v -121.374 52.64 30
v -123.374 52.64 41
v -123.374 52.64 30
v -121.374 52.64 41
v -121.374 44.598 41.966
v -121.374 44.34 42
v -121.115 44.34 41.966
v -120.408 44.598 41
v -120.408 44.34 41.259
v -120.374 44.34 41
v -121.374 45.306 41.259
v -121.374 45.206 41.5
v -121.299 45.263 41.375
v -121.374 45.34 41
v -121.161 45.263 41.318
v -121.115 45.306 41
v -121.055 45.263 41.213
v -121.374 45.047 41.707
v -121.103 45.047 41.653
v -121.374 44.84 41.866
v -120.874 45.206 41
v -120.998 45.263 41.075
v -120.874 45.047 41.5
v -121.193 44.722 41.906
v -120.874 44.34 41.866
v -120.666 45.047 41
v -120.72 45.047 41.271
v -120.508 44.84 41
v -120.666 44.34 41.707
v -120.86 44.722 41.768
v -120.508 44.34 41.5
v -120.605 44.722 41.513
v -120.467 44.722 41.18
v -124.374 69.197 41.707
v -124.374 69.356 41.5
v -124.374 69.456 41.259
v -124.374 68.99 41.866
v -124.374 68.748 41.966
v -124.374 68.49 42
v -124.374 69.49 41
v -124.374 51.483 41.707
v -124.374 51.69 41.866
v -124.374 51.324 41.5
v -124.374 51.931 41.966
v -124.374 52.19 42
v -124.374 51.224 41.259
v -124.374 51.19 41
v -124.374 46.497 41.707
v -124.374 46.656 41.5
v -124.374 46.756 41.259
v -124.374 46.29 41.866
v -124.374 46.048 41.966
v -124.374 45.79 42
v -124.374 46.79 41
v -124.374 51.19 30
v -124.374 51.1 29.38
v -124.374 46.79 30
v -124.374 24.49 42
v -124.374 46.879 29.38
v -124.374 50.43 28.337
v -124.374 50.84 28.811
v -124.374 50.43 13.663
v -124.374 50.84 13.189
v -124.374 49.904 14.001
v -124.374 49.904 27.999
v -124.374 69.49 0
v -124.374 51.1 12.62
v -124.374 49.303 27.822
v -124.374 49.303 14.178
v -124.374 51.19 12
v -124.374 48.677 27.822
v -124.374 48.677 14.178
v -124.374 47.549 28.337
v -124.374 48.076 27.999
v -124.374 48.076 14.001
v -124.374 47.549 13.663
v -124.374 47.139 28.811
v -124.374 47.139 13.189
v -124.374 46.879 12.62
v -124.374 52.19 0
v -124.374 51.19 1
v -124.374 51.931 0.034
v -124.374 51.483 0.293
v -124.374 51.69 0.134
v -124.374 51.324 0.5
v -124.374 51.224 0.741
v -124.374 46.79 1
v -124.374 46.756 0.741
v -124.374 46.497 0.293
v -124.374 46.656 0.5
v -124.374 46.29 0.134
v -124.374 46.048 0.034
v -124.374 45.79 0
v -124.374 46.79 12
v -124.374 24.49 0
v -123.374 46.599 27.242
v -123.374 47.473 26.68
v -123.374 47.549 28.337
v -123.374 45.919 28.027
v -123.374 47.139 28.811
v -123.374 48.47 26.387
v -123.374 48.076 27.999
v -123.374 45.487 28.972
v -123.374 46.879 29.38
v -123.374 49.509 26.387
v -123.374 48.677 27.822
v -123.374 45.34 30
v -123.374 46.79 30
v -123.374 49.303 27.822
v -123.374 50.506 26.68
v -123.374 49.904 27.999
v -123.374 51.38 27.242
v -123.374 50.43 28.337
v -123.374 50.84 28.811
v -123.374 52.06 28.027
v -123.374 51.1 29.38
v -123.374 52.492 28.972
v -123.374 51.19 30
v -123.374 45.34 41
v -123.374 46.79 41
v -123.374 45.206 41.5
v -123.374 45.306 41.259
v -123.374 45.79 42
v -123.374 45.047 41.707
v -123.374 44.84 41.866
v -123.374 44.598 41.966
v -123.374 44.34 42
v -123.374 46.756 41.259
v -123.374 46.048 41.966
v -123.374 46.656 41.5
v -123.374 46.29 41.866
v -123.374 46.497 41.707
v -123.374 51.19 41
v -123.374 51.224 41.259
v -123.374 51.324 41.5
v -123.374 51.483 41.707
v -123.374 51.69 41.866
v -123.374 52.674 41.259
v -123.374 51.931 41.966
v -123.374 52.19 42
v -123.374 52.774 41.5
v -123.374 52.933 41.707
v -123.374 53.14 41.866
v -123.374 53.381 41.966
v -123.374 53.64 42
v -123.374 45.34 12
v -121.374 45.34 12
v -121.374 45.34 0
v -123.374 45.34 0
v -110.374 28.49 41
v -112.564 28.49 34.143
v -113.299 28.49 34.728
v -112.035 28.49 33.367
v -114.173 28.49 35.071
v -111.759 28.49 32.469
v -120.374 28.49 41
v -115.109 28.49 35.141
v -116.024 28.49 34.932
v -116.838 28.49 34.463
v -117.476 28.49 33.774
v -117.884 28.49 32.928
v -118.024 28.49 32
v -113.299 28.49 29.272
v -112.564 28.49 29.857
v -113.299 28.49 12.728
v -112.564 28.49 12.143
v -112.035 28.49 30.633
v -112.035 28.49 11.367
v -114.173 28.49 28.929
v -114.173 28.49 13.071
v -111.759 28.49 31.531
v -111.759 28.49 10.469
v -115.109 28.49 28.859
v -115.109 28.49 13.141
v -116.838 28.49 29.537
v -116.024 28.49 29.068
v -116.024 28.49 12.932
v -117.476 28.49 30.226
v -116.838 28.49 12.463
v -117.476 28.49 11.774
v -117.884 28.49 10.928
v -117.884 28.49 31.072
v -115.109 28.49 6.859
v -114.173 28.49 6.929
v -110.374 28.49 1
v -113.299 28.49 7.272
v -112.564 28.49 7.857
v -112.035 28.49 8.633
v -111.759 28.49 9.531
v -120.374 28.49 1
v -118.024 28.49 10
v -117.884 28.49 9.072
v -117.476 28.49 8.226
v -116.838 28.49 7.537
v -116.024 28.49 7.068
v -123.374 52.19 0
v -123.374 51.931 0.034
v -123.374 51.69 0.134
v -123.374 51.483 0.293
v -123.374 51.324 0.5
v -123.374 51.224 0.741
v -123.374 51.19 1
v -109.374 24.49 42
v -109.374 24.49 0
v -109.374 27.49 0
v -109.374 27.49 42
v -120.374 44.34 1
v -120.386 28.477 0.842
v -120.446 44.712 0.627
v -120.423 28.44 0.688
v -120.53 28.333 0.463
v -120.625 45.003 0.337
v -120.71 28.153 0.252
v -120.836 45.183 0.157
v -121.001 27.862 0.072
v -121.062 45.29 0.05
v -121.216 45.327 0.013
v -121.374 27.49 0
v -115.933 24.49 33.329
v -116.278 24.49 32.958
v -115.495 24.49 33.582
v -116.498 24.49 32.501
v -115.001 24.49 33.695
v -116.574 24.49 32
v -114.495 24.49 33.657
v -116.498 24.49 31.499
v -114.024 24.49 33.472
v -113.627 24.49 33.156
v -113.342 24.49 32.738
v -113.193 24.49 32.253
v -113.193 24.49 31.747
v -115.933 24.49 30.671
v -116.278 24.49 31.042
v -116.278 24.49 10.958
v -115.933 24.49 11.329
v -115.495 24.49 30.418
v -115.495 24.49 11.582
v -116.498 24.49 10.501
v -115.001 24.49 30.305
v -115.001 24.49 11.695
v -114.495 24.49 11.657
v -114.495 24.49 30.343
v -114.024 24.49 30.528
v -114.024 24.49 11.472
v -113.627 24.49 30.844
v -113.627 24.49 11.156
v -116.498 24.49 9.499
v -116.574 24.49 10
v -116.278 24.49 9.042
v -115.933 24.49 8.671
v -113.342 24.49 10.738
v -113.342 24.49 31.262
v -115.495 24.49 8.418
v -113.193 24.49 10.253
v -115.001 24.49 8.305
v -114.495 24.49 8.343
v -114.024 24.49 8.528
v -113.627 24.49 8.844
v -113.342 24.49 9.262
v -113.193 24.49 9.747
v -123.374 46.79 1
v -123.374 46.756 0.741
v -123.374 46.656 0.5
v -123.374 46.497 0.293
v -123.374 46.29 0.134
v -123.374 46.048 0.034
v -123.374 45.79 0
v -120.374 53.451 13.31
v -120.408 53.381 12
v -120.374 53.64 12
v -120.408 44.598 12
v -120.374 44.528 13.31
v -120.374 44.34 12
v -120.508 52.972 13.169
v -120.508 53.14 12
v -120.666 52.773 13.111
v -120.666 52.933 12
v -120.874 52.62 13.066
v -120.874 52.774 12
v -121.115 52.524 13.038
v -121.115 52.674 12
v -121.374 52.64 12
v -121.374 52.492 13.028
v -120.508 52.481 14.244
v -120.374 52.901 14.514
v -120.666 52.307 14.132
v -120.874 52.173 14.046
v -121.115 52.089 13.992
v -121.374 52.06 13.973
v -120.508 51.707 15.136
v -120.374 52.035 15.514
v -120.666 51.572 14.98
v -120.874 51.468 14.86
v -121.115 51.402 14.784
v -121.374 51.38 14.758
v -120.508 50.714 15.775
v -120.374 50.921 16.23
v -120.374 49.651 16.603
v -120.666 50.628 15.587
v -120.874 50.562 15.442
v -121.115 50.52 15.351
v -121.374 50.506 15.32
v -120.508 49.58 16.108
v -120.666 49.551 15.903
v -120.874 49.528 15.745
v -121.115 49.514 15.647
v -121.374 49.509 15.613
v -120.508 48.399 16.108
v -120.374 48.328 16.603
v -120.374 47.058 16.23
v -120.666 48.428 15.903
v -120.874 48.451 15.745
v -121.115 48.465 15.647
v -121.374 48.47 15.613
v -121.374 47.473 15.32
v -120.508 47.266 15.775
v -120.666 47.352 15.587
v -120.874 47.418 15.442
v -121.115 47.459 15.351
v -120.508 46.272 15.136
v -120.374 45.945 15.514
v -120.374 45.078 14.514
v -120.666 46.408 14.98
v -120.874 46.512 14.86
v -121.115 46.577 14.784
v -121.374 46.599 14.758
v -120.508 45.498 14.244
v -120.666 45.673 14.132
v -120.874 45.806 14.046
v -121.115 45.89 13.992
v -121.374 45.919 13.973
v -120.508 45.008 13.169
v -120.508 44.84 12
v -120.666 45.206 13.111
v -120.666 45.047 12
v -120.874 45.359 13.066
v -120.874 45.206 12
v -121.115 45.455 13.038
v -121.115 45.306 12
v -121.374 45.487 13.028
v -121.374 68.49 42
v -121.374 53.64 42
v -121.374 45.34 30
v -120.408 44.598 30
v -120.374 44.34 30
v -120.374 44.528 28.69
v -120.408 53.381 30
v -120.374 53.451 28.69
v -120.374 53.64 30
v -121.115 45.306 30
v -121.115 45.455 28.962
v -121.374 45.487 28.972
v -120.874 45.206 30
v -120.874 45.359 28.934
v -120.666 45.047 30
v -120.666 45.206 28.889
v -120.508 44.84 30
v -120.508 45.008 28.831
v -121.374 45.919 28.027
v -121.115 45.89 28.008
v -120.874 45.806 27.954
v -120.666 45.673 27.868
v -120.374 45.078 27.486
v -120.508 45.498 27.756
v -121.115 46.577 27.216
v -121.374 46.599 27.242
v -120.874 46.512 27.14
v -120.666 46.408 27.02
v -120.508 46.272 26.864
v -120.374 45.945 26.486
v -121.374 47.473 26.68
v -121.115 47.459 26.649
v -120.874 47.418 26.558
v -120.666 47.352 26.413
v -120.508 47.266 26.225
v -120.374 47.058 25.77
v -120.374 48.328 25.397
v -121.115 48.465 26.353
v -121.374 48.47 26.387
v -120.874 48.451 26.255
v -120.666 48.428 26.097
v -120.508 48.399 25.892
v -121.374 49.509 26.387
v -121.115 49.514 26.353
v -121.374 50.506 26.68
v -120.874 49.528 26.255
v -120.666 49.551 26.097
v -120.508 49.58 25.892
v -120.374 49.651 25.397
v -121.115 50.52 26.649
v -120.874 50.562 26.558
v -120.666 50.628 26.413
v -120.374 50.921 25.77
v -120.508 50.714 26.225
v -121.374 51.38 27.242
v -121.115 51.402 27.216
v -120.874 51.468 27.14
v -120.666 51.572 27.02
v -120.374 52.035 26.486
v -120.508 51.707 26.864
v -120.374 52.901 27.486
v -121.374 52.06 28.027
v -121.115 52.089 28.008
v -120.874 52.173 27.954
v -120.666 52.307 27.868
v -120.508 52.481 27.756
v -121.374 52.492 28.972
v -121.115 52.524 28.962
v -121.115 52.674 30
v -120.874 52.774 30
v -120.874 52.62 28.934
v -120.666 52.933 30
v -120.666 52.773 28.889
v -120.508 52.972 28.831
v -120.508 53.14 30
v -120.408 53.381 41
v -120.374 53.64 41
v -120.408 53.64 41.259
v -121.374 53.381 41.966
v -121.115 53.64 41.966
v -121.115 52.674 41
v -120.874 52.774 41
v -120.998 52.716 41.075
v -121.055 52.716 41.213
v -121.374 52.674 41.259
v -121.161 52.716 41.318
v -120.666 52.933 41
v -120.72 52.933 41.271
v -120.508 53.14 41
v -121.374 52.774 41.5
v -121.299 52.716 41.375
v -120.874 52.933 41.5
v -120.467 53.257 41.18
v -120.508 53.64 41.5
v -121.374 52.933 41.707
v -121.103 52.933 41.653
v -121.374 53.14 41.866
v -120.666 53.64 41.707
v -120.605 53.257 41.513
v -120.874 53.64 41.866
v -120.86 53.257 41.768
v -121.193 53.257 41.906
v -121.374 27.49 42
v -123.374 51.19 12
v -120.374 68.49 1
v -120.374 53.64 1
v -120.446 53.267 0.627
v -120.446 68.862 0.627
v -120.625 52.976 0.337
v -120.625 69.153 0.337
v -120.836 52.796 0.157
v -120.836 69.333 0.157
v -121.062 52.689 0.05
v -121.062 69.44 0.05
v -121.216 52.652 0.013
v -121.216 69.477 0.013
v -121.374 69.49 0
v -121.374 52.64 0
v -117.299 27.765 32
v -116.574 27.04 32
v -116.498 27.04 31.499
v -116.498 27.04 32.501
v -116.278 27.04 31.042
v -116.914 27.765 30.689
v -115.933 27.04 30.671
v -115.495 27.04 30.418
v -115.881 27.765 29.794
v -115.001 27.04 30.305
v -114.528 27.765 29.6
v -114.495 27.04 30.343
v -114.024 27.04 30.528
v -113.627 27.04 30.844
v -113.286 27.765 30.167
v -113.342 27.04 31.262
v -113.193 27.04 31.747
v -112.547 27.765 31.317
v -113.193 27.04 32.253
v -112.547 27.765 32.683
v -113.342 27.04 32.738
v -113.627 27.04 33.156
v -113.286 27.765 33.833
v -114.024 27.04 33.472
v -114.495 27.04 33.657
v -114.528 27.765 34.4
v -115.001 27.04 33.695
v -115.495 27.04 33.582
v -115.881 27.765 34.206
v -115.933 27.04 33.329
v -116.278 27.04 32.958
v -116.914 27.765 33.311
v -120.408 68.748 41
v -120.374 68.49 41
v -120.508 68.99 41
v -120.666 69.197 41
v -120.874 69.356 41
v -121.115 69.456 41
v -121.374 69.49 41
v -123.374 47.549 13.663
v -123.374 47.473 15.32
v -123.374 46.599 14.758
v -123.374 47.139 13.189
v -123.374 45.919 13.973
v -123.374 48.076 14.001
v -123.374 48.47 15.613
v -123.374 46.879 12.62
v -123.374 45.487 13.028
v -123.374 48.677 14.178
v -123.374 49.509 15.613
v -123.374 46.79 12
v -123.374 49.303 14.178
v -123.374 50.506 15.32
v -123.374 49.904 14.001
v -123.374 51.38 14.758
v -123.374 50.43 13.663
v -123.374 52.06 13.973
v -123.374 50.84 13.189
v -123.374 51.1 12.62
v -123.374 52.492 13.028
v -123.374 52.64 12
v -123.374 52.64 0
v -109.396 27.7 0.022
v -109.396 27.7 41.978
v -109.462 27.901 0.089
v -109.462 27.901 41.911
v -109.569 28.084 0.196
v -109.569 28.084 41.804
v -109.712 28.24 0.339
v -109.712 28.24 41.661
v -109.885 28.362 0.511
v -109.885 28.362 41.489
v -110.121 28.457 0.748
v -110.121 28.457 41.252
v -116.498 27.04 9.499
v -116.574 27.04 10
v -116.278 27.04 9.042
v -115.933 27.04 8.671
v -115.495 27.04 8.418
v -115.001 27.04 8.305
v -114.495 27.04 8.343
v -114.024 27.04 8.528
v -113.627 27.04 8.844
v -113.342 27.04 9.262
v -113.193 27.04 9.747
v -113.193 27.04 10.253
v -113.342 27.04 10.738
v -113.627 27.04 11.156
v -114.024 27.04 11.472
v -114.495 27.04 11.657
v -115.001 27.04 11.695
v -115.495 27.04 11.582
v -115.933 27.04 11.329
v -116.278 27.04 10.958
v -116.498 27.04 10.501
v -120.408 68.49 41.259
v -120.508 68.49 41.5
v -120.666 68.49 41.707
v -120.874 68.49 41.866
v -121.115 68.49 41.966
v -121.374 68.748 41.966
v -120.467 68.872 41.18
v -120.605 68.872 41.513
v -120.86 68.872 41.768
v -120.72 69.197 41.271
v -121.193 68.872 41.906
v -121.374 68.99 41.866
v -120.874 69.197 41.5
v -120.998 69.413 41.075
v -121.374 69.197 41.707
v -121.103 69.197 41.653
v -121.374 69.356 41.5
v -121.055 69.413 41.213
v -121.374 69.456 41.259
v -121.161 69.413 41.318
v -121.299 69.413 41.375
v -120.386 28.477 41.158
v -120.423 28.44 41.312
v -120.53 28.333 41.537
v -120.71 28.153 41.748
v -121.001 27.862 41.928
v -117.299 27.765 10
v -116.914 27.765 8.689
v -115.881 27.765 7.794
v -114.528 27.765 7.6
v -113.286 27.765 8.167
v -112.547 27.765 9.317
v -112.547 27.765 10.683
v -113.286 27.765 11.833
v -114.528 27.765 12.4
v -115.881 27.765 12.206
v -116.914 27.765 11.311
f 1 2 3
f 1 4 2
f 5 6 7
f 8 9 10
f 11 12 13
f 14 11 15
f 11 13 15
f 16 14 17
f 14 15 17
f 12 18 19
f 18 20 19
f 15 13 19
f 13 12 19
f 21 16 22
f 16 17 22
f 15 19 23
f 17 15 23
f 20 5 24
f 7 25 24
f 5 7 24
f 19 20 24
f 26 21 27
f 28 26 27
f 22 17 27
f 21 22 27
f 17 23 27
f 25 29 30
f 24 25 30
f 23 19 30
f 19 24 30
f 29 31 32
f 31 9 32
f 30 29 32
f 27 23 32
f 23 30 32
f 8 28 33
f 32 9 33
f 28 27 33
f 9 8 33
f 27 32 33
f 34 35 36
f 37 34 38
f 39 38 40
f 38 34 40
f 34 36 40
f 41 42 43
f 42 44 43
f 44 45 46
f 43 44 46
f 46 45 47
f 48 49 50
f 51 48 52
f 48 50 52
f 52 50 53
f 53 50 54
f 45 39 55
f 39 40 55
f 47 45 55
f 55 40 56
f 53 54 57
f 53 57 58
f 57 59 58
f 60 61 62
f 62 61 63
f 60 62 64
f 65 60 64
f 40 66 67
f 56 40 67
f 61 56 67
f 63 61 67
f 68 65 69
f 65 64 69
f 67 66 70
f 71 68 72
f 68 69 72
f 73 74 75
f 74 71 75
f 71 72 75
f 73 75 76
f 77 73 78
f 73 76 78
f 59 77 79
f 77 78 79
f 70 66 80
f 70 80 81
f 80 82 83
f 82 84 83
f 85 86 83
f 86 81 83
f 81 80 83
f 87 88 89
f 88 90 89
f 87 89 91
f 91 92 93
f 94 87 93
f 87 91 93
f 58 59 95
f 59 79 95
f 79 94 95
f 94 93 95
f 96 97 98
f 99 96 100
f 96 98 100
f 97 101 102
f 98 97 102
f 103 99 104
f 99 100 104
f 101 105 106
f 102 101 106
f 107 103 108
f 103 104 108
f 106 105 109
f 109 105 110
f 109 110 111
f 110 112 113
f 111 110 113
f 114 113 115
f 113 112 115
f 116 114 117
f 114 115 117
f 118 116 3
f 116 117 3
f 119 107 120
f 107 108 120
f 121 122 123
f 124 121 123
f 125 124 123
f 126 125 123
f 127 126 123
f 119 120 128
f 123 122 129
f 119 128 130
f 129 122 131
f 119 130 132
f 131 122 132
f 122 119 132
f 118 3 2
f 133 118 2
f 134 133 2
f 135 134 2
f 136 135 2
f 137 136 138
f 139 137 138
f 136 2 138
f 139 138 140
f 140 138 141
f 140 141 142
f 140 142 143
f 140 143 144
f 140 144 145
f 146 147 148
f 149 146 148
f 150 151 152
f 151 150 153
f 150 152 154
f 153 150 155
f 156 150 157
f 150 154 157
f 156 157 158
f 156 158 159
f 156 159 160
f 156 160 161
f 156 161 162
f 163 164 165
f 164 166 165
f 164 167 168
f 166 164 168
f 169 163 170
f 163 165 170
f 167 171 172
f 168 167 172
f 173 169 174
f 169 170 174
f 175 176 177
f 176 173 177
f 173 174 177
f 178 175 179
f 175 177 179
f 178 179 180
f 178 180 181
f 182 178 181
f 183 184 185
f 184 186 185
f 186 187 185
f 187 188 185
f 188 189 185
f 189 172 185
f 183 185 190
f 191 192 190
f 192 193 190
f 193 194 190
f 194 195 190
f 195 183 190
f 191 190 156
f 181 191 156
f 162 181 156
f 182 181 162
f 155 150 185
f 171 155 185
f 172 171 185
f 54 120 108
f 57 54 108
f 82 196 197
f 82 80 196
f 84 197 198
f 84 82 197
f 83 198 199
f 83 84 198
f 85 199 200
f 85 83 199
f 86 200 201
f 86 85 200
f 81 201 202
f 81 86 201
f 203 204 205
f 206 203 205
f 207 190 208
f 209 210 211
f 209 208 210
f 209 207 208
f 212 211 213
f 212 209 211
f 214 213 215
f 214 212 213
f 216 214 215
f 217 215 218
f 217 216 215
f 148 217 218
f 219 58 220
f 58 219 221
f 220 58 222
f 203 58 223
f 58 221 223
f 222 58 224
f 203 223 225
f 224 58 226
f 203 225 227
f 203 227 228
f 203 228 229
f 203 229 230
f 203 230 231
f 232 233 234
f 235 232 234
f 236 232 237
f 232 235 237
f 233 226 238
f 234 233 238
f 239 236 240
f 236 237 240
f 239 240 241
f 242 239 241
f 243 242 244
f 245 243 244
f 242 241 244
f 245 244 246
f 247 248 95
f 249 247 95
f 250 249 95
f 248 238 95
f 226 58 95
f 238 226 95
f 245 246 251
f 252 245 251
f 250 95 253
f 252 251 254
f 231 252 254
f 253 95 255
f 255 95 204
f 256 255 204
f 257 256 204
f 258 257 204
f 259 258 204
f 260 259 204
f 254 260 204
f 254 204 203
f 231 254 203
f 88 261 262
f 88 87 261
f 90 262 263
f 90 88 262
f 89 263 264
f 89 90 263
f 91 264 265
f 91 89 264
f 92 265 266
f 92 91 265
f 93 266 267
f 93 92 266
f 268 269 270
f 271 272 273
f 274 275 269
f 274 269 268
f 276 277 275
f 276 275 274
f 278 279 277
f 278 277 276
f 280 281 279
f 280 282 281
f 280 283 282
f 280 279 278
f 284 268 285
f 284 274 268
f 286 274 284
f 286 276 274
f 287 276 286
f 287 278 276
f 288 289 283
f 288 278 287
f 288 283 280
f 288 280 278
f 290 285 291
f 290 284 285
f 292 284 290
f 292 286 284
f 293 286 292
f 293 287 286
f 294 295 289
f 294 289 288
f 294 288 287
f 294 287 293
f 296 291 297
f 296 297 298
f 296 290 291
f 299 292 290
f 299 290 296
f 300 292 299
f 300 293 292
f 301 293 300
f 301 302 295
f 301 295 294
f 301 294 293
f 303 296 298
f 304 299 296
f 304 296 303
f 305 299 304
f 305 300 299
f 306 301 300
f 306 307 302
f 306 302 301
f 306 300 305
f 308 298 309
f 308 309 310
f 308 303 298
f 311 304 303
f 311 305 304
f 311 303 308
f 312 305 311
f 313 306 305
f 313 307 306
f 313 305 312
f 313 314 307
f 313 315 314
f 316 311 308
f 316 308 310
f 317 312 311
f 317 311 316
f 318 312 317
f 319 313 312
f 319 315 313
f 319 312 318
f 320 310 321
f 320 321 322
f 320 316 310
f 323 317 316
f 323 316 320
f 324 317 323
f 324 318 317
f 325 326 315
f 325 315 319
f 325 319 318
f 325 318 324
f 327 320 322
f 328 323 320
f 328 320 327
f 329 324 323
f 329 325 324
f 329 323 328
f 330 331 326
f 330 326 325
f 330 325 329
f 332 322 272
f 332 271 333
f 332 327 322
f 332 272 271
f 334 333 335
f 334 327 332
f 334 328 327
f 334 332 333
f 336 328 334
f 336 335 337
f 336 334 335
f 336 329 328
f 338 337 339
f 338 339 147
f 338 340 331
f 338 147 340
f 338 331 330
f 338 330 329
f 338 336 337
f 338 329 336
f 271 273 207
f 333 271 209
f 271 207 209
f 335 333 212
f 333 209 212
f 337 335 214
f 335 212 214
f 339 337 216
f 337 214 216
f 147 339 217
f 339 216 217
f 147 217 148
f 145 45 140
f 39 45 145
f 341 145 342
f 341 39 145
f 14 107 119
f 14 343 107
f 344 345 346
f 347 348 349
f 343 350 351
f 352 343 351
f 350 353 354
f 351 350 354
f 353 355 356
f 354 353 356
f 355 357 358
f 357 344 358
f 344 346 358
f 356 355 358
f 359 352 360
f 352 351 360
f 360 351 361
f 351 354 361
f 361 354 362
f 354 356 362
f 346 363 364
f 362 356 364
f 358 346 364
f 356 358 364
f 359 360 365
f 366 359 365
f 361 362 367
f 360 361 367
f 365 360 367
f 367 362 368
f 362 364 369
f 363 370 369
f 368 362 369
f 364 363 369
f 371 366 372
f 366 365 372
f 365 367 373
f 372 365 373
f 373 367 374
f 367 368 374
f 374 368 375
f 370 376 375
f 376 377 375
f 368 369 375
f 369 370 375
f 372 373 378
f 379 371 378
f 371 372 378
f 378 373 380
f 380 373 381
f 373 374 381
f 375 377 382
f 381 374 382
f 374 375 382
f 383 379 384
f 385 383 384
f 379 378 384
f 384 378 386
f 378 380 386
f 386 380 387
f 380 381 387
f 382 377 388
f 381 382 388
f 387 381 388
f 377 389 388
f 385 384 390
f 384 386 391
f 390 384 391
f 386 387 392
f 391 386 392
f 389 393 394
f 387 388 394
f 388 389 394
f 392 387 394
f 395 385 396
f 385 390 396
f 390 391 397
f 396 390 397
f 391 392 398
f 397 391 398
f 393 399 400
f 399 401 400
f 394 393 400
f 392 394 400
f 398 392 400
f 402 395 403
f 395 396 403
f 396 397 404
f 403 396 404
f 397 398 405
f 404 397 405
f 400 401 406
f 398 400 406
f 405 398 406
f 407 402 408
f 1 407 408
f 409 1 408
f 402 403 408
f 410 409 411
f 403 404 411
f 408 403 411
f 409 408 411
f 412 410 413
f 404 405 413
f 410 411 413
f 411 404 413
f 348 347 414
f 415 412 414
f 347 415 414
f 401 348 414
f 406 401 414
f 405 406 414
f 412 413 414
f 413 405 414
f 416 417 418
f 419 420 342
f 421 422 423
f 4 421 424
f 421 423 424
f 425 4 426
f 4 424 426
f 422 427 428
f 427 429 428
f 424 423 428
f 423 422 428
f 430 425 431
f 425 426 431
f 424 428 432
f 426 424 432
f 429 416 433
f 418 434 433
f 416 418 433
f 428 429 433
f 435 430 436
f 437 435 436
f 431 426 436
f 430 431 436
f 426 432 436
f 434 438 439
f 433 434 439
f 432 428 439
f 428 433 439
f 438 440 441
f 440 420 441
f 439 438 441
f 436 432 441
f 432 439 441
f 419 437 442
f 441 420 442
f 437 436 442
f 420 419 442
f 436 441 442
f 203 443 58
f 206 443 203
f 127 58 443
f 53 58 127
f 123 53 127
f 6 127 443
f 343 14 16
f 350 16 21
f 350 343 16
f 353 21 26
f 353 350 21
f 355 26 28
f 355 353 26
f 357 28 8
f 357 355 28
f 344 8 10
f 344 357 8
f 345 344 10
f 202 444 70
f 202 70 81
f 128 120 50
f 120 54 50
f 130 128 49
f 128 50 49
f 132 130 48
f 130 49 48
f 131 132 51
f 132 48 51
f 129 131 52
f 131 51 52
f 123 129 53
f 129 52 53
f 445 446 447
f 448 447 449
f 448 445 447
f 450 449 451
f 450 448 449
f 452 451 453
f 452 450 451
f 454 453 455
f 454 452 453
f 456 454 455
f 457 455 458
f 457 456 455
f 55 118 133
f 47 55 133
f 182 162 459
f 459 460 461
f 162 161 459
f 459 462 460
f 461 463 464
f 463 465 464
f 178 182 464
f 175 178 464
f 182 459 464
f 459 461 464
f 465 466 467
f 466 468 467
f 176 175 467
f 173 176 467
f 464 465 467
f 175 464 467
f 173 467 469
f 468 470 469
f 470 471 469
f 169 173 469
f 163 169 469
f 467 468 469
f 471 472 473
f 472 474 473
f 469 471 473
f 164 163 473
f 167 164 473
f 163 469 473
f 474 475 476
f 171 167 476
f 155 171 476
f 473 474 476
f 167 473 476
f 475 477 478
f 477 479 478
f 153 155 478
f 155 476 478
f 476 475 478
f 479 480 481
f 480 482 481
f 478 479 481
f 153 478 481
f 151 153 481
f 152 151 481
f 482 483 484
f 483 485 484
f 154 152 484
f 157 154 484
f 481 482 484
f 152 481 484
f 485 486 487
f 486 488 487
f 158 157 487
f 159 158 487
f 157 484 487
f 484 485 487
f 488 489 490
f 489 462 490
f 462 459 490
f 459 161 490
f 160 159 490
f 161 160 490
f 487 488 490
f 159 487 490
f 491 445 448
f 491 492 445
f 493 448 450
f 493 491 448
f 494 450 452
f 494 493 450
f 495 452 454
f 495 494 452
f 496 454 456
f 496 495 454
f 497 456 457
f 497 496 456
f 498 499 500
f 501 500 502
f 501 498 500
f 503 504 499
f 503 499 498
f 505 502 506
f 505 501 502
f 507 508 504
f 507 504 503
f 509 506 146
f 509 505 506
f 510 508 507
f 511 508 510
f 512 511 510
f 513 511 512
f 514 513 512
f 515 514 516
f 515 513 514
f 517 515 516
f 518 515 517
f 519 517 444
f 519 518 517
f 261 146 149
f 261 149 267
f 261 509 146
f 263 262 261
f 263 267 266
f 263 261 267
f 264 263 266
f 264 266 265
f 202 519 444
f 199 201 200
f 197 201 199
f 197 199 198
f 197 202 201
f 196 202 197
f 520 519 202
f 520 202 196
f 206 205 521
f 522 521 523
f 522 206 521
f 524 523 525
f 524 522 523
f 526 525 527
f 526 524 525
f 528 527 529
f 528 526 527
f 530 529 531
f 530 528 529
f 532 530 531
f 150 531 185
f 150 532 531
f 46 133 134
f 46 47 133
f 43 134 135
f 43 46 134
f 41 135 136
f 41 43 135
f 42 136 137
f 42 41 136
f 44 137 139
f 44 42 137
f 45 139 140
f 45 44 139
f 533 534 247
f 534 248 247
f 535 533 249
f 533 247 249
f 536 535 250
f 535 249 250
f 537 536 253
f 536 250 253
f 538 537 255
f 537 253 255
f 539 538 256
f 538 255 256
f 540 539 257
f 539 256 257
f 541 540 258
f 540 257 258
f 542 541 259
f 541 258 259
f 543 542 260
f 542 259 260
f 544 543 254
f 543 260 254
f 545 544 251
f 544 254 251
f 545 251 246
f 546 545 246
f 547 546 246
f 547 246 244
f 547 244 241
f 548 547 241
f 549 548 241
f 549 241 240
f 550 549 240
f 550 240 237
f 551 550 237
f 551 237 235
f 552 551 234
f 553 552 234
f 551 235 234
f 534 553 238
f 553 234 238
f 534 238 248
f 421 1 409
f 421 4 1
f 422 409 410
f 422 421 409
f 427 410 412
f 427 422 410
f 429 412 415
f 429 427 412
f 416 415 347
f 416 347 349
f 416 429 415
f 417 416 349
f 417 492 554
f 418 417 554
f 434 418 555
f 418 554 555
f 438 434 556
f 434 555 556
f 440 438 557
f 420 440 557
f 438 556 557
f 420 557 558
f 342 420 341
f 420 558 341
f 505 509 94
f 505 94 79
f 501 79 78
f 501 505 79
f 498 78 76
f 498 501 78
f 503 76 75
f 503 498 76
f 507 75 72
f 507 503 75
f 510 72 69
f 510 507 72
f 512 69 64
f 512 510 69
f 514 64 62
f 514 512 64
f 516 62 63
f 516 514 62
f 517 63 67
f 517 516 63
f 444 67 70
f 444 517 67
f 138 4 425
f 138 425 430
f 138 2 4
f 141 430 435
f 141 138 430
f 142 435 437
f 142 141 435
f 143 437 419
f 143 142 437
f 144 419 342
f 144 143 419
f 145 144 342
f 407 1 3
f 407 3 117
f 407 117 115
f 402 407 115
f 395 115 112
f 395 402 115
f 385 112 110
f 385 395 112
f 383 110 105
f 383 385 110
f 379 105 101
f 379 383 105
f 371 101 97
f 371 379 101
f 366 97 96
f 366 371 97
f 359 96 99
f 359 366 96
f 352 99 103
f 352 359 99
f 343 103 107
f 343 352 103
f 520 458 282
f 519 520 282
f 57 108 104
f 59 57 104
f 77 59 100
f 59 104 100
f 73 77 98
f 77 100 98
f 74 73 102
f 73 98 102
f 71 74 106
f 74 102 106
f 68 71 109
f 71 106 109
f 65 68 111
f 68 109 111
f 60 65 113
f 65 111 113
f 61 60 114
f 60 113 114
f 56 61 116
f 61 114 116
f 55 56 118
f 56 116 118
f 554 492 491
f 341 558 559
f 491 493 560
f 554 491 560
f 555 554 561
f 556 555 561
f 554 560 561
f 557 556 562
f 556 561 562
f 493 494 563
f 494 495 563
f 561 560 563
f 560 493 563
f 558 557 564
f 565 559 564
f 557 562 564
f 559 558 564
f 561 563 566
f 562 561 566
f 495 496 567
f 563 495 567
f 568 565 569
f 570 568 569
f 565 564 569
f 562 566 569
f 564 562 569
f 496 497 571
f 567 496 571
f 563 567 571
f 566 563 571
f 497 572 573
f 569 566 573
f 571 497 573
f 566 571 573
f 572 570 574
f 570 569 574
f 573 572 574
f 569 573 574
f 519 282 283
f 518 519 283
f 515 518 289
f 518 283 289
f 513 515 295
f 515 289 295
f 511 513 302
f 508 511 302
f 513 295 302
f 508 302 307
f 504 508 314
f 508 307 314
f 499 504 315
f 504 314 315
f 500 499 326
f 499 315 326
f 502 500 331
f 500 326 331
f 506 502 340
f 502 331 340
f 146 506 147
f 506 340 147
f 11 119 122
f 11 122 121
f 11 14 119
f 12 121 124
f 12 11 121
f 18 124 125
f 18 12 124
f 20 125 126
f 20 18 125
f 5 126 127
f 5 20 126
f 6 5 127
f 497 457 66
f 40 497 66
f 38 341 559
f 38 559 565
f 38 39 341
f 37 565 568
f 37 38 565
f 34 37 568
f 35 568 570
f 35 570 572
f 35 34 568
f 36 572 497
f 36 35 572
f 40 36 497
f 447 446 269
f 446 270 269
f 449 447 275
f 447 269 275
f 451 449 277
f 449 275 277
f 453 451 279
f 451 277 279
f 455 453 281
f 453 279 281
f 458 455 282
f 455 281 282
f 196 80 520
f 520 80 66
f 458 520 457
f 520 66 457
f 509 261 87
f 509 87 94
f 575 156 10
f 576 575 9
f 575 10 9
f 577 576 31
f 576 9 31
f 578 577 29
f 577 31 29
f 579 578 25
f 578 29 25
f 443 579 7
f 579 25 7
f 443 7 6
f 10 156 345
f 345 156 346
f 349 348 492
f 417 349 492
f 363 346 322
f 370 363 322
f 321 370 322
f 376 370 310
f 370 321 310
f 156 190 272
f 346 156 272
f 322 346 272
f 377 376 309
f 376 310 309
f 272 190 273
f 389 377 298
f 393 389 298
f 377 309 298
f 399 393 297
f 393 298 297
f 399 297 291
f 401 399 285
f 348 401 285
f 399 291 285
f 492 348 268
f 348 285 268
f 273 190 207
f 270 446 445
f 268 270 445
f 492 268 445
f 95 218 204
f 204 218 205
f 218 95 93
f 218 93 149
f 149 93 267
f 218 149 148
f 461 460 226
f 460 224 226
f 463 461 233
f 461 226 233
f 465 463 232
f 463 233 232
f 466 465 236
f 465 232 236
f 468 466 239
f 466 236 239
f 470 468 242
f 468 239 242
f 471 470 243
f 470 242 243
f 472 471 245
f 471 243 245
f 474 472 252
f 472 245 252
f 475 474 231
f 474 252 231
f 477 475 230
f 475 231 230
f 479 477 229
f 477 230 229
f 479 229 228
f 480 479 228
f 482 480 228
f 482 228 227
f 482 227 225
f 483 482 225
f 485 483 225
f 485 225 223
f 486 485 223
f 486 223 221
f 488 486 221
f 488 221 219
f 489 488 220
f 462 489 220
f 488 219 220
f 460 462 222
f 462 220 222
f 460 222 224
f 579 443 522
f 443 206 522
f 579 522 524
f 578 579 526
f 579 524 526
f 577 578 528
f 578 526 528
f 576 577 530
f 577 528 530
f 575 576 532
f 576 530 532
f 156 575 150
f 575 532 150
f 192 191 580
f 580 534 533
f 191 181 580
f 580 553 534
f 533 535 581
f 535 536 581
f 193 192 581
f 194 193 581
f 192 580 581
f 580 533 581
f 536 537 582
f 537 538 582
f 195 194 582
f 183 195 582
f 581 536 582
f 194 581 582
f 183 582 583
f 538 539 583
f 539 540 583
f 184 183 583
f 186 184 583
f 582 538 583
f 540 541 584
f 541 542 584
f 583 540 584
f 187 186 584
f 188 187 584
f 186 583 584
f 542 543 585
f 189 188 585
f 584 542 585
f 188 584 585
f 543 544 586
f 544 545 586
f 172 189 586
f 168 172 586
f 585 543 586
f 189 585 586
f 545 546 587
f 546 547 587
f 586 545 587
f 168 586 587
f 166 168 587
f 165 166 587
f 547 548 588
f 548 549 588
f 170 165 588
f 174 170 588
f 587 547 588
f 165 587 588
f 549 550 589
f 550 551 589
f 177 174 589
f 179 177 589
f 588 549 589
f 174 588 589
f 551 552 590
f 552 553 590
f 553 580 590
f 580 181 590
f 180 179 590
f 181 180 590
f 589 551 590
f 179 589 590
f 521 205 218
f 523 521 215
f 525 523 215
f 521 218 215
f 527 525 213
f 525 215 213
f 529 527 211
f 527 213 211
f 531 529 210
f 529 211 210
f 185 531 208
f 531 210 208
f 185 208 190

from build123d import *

# Parameters (mm, degrees)
BOSS_EXTRUDE1_DEPTH                             = 42
CUT_EXTRUDE1_DEPTH                              = 3
CUT_EXTRUDE2_DEPTH                              = 2
CSK_FOR_M3_FLAT_HEAD_MACHINE_SCREW1_D           = 3.4
CSK_FOR_M3_FLAT_HEAD_MACHINE_SCREW1_CSINK_D     = 6.3
CSK_FOR_M3_FLAT_HEAD_MACHINE_SCREW1_CSINK_ANGLE = 90
FILLET3_R                                       = 1
FILLET4_R                                       = 1
FILLET5_R                                       = 1
FILLET6_R                                       = 1
FILLET7_R                                       = 1
FILLET8_R                                       = 1


with BuildPart() as part:
    # Sketch1 → Boss-Extrude1 (new body)
    with BuildSketch(Plane.XY):
        Polygon((-124.373548005, 69.489611766), (-124.373548005, 24.489611766), (-109.373548005, 24.489611766), (-109.373548005, 28.489611766), (-120.373548005, 28.489611766), (-120.373548005, 69.489611766), align=None)
    extrude(amount=BOSS_EXTRUDE1_DEPTH)

    # Sketch2 → Cut-Extrude1 (cut)
    with BuildSketch(Plane(origin=(-120.373548005, 0, 0), x_dir=(0, 0, -1), z_dir=(1, 0, 0))):
        with BuildLine():
            Line((-42, 52.639611766), (-30, 52.639611766))
            ThreePointArc((-30, 52.639611766), (-26.35, 48.989611766), (-30, 45.339611766))
            Line((-30, 45.339611766), (-42, 45.339611766))
            Line((-42, 45.339611766), (-42, 52.639611766))
        make_face()
    cut_extrude1 = extrude(amount=-CUT_EXTRUDE1_DEPTH, mode=Mode.SUBTRACT)

    # Sketch4 → Cut-Extrude2 (cut, through all)
    with BuildSketch(Plane(origin=(-123.373548005, 0, 0), x_dir=(0, 0, -1), z_dir=(1, 0, 0))):
        with BuildLine():
            Line((-42, 51.189611766), (-42, 46.789611766))
            Line((-42, 46.789611766), (-30, 46.789611766))
            ThreePointArc((-30, 46.789611766), (-27.8, 48.989611766), (-30, 51.189611766))
            Line((-30, 51.189611766), (-42, 51.189611766))
        make_face()
    cut_extrude2 = extrude(amount=-CUT_EXTRUDE2_DEPTH, mode=Mode.SUBTRACT)

    # Mirror2: Cut-Extrude1, Cut-Extrude2 across plane
    add(cut_extrude1.mirror(Plane.XY.offset(21)), mode=Mode.SUBTRACT)
    add(cut_extrude2.mirror(Plane.XY.offset(21)), mode=Mode.SUBTRACT)

    # CSK for M3 Flat Head Machine Screw1 (through all)
    with Locations(Plane(origin=(0, 28.489611766, 0), x_dir=(1, 0, 0), z_dir=(0, 1, 0))):
        with Locations((-114.873548005, -32), (-114.873548005, -10)):
            CounterSinkHole(CSK_FOR_M3_FLAT_HEAD_MACHINE_SCREW1_D / 2, CSK_FOR_M3_FLAT_HEAD_MACHINE_SCREW1_CSINK_D / 2, counter_sink_angle=CSK_FOR_M3_FLAT_HEAD_MACHINE_SCREW1_CSINK_ANGLE)

    # Fillet3
    fillet3_edges = [part.edges().sort_by_distance(p)[0] for p in [
        (-120.373548005, 36.914611766, 42),
    ]]
    fillet(fillet3_edges, radius=FILLET3_R)

    # Fillet4
    fillet4_edges = [part.edges().sort_by_distance(p)[0] for p in [
        (-120.373548005, 61.064611766, 42),
    ]]
    fillet(fillet4_edges, radius=FILLET4_R)

    # Fillet5
    fillet5_edges = [part.edges().sort_by_distance(p)[0] for p in [
        (-120.666441224, 52.639611766, 41.707106781),
        (-122.373548005, 45.339611766, 42),
        (-122.373548005, 52.639611766, 42),
        (-120.373548005, 48.989611766, 26.35),
        (-120.373548005, 52.639611766, 35.5),
        (-120.373548005, 45.339611766, 35.5),
        (-120.666441224, 45.339611766, 41.707106781),
    ]]
    fillet(fillet5_edges, radius=FILLET5_R)

    # Fillet6
    fillet6_edges = [part.edges().sort_by_distance(p)[0] for p in [
        (-122.873548005, 69.489611766, 42),
        (-120.666441224, 69.489611766, 41.707106781),
        (-114.873548005, 28.489611766, 42),
        (-109.373548005, 28.489611766, 21),
        (-114.873548005, 28.489611766, 0),
        (-120.373548005, 36.914611766, 0),
        (-120.373548005, 48.989611766, 15.65),
        (-120.373548005, 45.339611766, 6),
        (-120.373548005, 52.639611766, 6),
        (-120.373548005, 61.064611766, 0),
        (-120.373548005, 69.489611766, 20.5),
    ]]
    fillet(fillet6_edges, radius=FILLET6_R)

    # Fillet7
    fillet7_edges = [part.edges().sort_by_distance(p)[0] for p in [
        (-123.873548005, 51.189611766, 42),
    ]]
    fillet(fillet7_edges, radius=FILLET7_R)

    # Fillet8
    fillet8_edges = [part.edges().sort_by_distance(p)[0] for p in [
        (-123.873548005, 46.789611766, 42),
        (-123.873548005, 51.189611766, 0),
        (-123.873548005, 46.789611766, 0),
    ]]
    fillet(fillet8_edges, radius=FILLET8_R)


solid = part.part
